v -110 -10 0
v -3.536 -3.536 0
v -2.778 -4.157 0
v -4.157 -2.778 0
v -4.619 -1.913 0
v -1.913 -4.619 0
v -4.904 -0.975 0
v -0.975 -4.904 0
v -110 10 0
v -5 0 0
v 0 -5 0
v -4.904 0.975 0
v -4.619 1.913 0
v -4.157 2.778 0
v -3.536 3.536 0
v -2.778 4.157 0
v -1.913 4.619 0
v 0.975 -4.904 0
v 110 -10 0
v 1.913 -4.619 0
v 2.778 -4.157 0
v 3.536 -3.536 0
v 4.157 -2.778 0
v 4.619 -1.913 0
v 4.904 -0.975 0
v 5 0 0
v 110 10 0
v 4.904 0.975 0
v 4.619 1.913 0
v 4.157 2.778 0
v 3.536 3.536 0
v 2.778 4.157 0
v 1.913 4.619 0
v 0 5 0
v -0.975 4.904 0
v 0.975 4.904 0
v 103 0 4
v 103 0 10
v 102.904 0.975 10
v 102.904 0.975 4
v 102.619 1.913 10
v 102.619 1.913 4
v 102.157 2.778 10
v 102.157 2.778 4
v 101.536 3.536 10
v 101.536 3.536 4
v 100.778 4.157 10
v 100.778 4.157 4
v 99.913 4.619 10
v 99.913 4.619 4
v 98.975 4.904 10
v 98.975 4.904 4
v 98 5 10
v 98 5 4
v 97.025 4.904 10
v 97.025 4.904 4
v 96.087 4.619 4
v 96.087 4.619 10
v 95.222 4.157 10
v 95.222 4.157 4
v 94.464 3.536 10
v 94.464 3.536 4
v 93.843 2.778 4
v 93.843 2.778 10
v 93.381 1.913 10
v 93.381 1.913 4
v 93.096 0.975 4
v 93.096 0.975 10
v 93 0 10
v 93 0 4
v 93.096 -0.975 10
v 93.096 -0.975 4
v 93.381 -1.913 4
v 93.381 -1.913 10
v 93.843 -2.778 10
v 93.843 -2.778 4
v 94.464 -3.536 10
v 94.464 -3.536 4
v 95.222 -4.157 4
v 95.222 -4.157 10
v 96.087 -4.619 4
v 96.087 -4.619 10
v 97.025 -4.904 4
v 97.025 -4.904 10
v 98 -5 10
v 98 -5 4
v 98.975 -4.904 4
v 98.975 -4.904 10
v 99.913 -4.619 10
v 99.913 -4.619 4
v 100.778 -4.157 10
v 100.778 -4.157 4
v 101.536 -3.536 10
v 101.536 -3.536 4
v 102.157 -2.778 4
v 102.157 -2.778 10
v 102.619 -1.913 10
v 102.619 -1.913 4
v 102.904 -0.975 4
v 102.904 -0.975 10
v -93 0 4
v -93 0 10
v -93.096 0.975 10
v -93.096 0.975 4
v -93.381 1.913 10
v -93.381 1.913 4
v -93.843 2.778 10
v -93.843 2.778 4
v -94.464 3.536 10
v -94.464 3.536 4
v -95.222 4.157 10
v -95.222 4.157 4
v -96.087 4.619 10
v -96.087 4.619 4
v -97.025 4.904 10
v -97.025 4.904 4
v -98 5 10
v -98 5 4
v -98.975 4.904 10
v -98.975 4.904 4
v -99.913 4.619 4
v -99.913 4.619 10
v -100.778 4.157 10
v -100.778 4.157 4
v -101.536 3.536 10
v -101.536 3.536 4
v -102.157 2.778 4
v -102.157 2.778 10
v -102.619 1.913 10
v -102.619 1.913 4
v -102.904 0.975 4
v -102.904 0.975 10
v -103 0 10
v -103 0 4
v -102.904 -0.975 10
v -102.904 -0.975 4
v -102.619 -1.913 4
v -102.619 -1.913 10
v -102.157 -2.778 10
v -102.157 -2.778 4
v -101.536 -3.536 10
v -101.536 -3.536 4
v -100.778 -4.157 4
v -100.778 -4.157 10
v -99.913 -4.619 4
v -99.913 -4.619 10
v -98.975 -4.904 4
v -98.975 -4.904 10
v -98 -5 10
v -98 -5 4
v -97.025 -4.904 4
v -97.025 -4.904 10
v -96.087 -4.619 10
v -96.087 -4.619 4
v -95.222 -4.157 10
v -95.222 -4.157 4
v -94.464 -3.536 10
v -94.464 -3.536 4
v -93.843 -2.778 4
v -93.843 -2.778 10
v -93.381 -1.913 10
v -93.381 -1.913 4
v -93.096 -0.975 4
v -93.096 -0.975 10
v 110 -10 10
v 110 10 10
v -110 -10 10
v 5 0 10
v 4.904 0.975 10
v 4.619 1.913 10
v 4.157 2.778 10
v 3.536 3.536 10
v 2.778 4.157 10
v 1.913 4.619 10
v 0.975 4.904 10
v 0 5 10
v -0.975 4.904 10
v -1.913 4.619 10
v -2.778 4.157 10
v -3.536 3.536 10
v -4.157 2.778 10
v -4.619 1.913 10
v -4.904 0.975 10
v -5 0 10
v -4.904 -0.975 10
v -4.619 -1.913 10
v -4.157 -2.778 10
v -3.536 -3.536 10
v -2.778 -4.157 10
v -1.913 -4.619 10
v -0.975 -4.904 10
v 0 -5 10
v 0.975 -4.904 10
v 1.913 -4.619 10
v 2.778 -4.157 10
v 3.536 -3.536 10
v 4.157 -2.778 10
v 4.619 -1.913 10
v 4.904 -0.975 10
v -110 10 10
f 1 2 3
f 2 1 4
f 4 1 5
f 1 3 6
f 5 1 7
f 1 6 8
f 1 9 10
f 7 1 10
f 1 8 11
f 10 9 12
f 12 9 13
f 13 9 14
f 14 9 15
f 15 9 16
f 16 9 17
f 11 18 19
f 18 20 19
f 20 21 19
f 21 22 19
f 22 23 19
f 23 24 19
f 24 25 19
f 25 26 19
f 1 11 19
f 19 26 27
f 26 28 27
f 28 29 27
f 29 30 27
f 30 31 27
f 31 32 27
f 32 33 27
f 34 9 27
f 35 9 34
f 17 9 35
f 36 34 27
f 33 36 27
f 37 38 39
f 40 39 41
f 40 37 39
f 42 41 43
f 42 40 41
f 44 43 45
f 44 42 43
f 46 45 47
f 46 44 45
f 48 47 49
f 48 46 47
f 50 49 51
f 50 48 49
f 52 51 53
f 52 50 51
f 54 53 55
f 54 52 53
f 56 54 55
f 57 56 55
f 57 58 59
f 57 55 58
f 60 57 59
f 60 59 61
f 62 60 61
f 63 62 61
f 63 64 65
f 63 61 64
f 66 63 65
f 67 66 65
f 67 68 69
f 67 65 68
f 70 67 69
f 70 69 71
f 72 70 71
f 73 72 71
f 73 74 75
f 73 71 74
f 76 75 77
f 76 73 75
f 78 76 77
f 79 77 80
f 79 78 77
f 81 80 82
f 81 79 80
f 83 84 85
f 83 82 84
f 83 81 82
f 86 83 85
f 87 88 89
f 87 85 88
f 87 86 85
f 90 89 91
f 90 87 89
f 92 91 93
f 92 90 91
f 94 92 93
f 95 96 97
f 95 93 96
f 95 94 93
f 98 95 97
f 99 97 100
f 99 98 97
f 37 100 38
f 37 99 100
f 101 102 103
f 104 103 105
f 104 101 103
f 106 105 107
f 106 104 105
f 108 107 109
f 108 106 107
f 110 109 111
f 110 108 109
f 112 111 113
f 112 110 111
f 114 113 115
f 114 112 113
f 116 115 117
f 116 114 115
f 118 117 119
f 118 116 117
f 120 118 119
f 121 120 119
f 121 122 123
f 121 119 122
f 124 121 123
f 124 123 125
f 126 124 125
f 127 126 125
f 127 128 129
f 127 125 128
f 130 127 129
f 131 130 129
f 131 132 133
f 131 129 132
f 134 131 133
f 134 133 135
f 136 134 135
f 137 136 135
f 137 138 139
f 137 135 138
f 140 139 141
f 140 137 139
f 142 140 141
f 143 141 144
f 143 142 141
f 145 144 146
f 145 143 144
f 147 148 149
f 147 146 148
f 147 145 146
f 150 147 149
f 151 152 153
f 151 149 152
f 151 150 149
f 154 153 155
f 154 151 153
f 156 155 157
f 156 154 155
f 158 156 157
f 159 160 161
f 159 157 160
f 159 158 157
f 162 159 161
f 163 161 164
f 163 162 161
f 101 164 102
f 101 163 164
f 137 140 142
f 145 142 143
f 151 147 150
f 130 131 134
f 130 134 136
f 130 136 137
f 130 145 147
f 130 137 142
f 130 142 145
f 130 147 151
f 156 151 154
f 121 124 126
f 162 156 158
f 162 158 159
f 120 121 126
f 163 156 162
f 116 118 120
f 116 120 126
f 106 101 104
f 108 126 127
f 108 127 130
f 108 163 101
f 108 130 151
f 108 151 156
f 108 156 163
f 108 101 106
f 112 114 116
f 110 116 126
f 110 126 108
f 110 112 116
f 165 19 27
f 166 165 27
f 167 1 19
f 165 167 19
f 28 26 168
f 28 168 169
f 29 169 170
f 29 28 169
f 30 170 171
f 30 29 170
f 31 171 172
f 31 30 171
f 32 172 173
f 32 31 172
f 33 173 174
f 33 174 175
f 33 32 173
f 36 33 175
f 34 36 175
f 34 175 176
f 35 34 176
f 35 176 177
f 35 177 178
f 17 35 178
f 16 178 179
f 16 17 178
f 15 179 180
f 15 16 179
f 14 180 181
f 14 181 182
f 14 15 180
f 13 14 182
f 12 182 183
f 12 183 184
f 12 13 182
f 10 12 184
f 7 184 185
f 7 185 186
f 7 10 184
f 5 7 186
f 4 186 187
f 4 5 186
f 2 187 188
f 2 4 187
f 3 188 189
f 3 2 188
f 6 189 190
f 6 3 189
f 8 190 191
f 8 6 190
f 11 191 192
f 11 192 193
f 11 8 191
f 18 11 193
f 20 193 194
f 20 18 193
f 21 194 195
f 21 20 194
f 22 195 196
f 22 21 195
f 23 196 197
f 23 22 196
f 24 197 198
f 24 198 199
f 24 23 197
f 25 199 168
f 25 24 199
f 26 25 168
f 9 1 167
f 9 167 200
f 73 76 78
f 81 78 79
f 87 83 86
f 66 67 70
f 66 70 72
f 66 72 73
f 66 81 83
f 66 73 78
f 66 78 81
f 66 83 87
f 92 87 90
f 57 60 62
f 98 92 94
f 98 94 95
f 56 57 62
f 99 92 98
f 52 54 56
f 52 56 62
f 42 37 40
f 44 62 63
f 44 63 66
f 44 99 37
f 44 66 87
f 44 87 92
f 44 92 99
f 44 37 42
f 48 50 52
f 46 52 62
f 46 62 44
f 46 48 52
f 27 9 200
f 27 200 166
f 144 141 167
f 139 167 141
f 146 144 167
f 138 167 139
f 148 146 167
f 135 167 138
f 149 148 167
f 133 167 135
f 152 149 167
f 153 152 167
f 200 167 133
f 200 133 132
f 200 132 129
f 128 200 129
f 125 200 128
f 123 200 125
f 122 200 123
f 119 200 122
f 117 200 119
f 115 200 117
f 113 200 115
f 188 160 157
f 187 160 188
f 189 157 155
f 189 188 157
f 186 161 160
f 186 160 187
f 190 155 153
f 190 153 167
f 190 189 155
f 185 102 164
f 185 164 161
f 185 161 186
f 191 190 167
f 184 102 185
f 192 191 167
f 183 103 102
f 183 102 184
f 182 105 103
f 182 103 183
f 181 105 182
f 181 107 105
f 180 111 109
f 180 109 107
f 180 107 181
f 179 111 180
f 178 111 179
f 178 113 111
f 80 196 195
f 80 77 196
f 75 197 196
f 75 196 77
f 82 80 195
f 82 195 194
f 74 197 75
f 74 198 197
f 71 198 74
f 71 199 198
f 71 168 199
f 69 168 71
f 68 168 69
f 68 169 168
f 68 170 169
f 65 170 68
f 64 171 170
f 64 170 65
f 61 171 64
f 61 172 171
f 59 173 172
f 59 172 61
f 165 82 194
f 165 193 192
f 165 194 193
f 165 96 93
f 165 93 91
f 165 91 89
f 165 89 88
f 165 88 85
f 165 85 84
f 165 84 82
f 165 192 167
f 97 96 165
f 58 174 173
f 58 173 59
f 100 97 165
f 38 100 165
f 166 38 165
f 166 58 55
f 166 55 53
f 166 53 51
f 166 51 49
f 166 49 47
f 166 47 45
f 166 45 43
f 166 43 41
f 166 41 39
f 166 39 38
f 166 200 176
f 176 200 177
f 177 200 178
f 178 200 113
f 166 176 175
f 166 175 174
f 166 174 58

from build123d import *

# Parameters (mm, degrees)
CYLINDER_R        = 5
CYLINDER_DEPTH    = 10
CYLINDER004_R     = 5
CYLINDER004_DEPTH = 10
CYLINDER005_R     = 5
CYLINDER005_DEPTH = 10
BOX002_W          = 220
BOX002_H          = 20
BOX002_DEPTH      = 10


with BuildPart() as cilindro:
    # Cylinder → Cylinder (new body)
    with BuildSketch(Plane.XY):
        Circle(CYLINDER_R)
    extrude(amount=CYLINDER_DEPTH)


with BuildPart() as cilindro004:
    # Cylinder004 → Cylinder004 (new body)
    with BuildSketch(Plane(origin=(-98, 0, 4), x_dir=(1, 0, 0), z_dir=(0, 0, 1))):
        Circle(CYLINDER004_R)
    extrude(amount=CYLINDER004_DEPTH)


with BuildPart() as cilindro005:
    # Cylinder005 → Cylinder005 (new body)
    with BuildSketch(Plane(origin=(98, 0, 4), x_dir=(1, 0, 0), z_dir=(0, 0, 1))):
        Circle(CYLINDER005_R)
    extrude(amount=CYLINDER005_DEPTH)


with BuildPart() as sujeto001:
    # Box002 → Box002 (new body)
    with BuildSketch(Plane(origin=(-110, -10, 0), x_dir=(1, 0, 0), z_dir=(0, 0, 1))):
        with Locations((110, 10)):
            Rectangle(BOX002_W, BOX002_H)
    extrude(amount=BOX002_DEPTH)

    # Cut004: cut Cilindro005
    add(cilindro005.part, mode=Mode.SUBTRACT)

    # Cut005: cut Cilindro004
    add(cilindro004.part, mode=Mode.SUBTRACT)

    # Cut: cut Cilindro
    add(cilindro.part, mode=Mode.SUBTRACT)


solid = sujeto001.part
